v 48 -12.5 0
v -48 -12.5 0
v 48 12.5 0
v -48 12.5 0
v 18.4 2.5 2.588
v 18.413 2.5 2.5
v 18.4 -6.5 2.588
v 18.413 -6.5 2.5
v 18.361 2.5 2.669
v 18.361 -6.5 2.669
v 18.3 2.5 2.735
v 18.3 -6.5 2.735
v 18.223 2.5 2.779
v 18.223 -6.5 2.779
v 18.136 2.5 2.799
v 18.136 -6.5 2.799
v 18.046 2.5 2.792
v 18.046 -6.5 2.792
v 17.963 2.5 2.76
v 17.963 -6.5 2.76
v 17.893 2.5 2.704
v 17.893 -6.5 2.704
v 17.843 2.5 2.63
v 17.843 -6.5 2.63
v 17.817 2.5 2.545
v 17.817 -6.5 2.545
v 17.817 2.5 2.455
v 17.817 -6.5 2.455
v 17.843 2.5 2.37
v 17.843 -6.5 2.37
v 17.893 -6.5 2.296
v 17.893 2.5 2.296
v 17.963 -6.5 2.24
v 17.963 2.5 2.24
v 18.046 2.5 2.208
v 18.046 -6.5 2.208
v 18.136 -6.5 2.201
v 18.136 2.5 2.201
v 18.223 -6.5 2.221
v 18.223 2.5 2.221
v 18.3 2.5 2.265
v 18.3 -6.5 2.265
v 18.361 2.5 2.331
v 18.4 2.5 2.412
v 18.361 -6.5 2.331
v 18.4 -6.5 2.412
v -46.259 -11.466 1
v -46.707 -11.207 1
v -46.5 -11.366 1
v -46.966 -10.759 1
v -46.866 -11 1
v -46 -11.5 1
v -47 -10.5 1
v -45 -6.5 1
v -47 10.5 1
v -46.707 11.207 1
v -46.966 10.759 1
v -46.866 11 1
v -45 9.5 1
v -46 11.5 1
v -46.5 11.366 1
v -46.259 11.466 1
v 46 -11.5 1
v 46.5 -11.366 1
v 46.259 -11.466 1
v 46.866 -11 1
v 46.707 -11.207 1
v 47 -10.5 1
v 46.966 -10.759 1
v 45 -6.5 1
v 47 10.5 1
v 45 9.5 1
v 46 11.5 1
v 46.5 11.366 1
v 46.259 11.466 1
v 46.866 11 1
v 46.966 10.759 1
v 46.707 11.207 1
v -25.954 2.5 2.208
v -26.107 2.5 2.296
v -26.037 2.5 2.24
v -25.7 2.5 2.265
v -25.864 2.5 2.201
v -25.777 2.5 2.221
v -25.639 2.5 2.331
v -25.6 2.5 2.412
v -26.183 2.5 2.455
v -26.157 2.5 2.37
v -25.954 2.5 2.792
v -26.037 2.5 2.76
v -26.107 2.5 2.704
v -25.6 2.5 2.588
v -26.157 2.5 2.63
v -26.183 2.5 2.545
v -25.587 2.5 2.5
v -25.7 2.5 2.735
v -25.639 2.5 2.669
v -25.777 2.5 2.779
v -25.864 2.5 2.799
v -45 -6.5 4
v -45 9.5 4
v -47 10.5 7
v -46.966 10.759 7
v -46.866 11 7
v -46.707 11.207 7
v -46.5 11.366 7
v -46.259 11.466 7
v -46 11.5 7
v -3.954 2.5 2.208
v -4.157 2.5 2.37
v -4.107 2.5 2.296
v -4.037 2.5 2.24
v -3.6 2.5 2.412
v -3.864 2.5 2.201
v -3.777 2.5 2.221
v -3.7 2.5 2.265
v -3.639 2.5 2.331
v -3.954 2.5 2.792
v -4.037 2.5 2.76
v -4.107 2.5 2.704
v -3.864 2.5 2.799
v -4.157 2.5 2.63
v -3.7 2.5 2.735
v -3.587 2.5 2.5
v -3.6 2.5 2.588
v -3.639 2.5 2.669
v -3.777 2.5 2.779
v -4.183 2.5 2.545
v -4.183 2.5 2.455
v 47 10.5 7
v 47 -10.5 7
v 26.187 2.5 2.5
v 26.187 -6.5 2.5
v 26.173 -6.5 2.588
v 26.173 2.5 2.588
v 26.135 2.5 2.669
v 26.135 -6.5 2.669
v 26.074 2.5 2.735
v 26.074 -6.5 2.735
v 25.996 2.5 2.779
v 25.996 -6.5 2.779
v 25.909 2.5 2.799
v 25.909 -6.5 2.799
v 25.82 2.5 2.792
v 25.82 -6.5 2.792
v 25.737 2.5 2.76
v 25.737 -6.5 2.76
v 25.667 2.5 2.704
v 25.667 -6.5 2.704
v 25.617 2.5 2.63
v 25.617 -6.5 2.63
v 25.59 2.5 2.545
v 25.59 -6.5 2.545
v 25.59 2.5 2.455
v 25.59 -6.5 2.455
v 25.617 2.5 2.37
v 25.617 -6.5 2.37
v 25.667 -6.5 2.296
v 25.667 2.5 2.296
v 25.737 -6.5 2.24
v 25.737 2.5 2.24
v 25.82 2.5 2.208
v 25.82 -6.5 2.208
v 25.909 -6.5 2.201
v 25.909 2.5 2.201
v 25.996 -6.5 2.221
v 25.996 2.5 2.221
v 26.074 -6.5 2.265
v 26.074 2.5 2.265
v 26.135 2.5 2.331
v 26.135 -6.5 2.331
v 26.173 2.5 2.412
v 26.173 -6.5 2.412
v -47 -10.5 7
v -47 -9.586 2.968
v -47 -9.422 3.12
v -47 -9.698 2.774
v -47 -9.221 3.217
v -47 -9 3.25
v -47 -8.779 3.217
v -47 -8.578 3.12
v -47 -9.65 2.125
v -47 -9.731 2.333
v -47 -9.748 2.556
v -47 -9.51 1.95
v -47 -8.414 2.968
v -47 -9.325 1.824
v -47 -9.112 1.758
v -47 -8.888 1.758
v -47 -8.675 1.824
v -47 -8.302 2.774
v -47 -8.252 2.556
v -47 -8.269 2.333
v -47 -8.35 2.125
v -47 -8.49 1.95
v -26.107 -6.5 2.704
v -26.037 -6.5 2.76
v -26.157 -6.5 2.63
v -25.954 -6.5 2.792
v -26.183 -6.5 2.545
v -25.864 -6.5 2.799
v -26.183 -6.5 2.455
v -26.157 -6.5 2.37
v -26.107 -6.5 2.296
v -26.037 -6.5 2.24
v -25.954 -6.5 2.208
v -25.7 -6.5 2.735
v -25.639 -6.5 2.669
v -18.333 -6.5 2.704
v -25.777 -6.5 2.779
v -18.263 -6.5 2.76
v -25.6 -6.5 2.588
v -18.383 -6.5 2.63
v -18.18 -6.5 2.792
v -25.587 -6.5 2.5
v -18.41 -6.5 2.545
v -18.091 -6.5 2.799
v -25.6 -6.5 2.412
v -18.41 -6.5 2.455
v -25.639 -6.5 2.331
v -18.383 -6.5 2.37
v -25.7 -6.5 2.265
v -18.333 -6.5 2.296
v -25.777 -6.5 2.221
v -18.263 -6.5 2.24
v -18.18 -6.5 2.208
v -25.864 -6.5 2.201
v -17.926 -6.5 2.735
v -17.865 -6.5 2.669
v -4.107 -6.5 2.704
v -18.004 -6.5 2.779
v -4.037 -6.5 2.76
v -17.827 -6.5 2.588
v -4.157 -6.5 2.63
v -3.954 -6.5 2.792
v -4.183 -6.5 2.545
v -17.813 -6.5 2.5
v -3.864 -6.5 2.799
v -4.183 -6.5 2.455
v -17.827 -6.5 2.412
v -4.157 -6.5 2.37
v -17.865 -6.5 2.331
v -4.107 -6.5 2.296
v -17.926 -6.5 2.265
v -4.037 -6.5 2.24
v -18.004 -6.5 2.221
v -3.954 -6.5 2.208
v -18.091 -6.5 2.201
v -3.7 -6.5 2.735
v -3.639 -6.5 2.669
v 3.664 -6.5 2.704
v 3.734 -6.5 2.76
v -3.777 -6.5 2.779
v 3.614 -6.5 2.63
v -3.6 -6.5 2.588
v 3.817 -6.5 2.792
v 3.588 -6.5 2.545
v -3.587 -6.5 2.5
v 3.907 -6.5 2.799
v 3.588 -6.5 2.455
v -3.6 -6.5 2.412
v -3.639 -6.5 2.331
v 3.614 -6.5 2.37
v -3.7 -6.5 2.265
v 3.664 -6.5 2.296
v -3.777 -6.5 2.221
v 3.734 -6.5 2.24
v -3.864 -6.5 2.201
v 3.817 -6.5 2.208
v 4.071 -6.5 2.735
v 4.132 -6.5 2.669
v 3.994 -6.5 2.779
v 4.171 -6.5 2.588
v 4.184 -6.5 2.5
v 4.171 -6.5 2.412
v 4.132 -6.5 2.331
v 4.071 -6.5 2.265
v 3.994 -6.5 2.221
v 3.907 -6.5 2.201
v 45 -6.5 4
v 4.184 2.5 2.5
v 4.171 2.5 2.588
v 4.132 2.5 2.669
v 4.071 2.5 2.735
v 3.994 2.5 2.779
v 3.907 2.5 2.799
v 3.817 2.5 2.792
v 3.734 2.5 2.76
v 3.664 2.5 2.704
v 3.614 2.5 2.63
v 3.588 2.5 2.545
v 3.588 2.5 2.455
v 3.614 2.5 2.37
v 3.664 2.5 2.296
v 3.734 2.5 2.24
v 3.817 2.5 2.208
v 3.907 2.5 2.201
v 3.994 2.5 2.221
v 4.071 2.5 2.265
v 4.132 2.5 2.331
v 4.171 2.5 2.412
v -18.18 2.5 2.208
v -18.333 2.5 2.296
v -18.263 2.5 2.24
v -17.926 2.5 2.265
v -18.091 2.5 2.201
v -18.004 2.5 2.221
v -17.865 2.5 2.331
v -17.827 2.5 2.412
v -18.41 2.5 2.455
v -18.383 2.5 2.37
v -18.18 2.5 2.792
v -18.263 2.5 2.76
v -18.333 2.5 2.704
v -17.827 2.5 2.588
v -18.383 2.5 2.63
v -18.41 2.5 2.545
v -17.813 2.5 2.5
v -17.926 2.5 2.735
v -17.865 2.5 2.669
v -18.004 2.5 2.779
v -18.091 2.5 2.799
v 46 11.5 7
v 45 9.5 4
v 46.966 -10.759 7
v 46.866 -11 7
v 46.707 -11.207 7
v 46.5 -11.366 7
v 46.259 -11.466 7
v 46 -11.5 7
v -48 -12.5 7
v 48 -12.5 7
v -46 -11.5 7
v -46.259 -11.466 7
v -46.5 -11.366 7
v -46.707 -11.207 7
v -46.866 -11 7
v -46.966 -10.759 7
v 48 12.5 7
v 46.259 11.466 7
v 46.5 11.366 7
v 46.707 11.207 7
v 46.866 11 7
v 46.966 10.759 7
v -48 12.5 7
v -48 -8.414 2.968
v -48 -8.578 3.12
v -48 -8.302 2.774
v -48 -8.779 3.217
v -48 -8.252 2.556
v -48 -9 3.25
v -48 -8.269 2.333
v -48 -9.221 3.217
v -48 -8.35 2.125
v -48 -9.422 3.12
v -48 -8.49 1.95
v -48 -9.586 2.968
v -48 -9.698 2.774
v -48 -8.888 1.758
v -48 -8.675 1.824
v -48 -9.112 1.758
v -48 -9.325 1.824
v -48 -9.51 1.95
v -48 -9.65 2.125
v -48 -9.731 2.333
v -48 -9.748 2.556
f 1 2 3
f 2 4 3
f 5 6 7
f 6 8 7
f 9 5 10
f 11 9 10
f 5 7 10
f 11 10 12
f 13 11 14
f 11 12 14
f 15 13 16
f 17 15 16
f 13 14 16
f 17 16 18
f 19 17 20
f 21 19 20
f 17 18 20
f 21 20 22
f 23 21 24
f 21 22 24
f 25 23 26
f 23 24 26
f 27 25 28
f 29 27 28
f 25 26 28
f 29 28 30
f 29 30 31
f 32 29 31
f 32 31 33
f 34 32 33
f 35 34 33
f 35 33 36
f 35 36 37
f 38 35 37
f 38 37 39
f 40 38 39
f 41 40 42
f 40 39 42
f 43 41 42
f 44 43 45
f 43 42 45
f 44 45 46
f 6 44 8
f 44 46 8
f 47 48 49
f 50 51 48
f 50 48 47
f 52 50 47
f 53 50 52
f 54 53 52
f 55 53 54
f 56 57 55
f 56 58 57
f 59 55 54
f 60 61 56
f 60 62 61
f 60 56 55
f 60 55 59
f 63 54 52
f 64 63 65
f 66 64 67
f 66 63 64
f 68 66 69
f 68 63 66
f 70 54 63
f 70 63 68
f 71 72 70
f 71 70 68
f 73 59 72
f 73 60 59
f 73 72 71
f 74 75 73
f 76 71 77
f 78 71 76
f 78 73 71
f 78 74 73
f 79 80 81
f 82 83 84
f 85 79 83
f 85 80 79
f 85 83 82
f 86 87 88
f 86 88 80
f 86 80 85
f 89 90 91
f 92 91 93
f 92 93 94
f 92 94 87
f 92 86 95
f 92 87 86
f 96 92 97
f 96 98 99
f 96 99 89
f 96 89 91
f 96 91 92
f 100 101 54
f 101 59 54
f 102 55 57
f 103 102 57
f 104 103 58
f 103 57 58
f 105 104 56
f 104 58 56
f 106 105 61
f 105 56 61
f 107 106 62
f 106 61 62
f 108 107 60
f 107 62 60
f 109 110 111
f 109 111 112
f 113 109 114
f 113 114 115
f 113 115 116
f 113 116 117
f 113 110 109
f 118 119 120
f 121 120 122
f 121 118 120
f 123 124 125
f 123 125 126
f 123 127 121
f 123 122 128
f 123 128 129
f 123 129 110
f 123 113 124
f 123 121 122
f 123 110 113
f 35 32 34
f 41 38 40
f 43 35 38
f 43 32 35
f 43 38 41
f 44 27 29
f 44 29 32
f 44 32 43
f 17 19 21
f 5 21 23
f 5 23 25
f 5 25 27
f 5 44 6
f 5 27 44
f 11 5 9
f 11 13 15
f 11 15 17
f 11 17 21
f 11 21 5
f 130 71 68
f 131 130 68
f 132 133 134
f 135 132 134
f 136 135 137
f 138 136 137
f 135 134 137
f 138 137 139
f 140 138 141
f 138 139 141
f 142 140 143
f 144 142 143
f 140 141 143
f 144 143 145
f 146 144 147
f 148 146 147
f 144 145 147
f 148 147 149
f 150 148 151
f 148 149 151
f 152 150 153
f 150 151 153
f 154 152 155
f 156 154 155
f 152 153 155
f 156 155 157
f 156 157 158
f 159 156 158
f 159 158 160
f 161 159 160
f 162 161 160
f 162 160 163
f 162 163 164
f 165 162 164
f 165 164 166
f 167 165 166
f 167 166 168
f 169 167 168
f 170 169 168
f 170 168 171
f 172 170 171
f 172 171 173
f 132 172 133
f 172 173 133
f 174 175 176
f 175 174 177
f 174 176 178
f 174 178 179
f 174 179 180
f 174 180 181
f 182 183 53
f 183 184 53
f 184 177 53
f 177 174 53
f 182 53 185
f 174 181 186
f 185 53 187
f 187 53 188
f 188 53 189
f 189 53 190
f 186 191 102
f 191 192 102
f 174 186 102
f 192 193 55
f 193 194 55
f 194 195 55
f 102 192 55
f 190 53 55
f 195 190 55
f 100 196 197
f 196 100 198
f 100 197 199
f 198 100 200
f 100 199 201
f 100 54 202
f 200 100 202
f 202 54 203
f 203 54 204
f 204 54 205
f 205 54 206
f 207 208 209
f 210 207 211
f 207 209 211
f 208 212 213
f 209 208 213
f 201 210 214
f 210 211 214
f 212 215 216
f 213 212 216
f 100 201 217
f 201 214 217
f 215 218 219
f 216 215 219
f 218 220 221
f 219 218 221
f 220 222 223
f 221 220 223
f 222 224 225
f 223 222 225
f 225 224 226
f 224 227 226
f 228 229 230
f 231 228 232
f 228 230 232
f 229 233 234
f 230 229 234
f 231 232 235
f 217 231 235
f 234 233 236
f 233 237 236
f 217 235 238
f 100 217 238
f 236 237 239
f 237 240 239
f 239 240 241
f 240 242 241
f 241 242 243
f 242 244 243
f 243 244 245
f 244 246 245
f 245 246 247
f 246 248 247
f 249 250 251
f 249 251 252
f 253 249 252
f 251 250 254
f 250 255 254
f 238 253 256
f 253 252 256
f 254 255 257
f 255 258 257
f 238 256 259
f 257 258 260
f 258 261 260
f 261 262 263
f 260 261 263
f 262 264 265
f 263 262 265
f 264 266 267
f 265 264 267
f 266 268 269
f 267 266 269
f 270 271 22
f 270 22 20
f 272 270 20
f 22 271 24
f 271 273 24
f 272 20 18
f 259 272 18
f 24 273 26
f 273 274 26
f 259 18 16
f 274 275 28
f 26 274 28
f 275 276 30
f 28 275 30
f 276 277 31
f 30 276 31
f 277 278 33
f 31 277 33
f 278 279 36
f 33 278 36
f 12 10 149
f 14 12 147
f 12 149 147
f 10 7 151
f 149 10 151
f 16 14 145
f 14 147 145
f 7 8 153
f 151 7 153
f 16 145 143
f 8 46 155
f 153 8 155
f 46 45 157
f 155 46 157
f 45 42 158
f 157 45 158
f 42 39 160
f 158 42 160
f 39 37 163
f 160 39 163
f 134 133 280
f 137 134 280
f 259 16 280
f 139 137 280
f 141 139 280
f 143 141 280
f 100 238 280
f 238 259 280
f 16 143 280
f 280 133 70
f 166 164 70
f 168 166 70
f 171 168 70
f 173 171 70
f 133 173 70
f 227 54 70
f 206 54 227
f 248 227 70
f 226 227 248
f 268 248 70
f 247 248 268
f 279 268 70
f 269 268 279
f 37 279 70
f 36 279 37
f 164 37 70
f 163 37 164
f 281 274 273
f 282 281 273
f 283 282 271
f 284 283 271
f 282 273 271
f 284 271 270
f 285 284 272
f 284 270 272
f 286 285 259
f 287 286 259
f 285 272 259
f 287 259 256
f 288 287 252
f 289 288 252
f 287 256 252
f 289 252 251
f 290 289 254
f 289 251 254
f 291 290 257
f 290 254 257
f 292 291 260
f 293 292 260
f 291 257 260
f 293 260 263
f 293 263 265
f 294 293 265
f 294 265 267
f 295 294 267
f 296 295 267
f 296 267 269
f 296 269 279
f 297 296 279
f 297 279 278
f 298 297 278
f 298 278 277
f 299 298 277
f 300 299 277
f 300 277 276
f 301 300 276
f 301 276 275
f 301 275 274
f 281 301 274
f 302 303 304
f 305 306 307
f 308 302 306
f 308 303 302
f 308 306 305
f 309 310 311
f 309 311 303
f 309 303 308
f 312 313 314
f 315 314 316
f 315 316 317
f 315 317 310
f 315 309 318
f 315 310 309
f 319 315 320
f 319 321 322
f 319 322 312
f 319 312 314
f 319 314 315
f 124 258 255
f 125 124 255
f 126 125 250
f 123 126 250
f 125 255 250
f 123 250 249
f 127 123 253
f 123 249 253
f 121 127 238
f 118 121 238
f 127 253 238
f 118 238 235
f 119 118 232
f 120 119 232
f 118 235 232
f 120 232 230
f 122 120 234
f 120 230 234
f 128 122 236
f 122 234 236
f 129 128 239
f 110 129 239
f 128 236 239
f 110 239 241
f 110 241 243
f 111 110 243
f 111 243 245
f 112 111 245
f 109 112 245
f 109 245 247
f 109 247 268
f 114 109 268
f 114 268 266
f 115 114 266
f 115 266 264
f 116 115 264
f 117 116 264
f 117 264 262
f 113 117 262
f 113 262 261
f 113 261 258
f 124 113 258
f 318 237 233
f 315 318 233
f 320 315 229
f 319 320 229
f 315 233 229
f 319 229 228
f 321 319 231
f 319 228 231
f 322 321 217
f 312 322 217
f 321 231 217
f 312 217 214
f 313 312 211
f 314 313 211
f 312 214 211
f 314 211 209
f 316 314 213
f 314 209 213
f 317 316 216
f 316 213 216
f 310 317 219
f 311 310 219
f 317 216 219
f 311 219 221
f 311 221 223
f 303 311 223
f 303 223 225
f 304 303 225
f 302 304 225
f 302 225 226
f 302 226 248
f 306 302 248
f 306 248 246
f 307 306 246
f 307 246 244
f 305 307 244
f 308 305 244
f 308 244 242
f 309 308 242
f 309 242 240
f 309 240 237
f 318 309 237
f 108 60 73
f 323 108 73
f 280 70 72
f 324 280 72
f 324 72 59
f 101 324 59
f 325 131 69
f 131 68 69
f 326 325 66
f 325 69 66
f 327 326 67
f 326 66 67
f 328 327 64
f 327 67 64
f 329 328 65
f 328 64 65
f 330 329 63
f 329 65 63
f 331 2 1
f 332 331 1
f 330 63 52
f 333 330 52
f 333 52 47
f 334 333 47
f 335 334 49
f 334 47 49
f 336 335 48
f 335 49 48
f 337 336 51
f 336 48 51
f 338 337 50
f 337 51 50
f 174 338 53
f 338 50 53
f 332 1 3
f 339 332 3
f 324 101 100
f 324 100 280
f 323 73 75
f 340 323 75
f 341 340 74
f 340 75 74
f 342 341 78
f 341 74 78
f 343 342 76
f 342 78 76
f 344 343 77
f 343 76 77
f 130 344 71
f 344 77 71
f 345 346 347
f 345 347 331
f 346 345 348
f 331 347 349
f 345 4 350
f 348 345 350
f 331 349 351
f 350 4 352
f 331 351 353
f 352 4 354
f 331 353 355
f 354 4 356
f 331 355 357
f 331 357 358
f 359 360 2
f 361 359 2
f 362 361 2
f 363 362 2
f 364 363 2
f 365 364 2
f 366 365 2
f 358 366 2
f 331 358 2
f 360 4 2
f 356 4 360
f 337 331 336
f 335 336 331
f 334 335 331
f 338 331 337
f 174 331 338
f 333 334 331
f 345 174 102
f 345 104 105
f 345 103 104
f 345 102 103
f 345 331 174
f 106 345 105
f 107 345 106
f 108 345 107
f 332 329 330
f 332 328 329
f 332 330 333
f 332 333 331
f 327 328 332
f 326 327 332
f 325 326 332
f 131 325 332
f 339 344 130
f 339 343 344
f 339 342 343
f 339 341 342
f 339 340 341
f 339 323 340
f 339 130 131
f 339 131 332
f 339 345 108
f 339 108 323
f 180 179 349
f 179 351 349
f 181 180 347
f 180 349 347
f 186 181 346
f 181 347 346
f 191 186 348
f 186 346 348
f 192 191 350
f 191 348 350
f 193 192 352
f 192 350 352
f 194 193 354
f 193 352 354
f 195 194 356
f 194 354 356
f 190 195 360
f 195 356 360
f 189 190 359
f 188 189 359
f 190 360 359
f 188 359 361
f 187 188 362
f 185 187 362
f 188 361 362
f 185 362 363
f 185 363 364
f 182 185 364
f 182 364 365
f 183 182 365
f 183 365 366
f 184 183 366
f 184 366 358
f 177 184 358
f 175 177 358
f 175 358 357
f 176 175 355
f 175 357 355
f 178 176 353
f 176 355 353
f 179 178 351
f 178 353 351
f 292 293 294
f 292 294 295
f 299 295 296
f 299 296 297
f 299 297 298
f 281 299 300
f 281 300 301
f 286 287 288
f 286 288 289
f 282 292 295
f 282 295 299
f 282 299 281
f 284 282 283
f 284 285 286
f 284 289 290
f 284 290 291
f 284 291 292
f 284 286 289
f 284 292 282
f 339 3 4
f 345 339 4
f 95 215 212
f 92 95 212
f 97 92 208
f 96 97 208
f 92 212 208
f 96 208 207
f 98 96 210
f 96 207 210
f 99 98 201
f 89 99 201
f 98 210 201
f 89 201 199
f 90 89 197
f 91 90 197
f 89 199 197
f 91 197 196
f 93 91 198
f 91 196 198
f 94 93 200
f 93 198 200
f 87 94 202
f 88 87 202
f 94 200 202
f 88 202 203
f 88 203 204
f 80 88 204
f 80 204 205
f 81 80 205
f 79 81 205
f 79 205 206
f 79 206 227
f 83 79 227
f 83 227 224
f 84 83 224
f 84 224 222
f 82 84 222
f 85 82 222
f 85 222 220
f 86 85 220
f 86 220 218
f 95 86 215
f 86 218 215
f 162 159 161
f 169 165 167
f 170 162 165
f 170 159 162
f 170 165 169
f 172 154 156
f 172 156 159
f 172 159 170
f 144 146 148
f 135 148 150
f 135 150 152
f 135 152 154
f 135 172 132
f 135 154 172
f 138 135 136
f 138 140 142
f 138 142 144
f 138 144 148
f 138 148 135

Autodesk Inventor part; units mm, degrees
ref_plane "YZ Plane" through (0, 0, 0) normal (1, 0, 0) x (0, 1, 0)
ref_plane "XZ Plane" through (0, 0, 0) normal (0, 1, 0) x (-1, 0, 0)
ref_plane "XY Plane" through (0, 0, 0) normal (0, 0, 1) x (1, 0, 0)
sketch "Sketch2" plane through (0, 0, 0) normal (0, 0, 1) x (1, 0, 0)
  line L0 (-46, 11.5) -> (46, 11.5)
  line L1 (47, 10.5) -> (47, -10.5)
  line L2 (46, -11.5) -> (-46, -11.5)
  line L3 (-47, -10.5) -> (-47, 10.5)
  line L4 (-47, 11.5) -> (47, -11.5) construction
  line L5 (47, 11.5) -> (-47, -11.5) construction
  line L6 (48, 12.5) -> (-48, 12.5)
  line L7 (-48, 12.5) -> (-48, -12.5)
  line L8 (-48, -12.5) -> (48, -12.5)
  line L9 (48, -12.5) -> (48, 12.5)
  arc A0 (47, 10.5) -> (46, 11.5) centre (46, 10.5) ccw
  arc A1 (46, -11.5) -> (47, -10.5) centre (46, -10.5) ccw
  arc A2 (-47, -10.5) -> (-46, -11.5) centre (-46, -10.5) ccw
  arc A3 (-46, 11.5) -> (-47, 10.5) centre (-46, 10.5) ccw
  line L10 (-45, -6.5) -> (45, -6.5)
  line L11 (45, -6.5) -> (45, 9.5)
  line L12 (45, 9.5) -> (-45, 9.5)
  line L13 (-45, 9.5) -> (-45, -6.5)
  point P0 (0, 0)
  point P1 (0, 1.6851)
  dimension "d0" = 94
  dimension "d1" = 23
  dimension "d3" = 1
  dimension "d10" = 1
  dimension "d84" = 90
  dimension "d85" = 16
  dimension "d86" = 2
  dimension "d87" = 2
  dimension "d95" = 2
extrude "Extrusion1" add sketch "Sketch2" along normal blind 1 contours L0 A0 L1 A1 L2 A2 L3 A3 | L9 L8 L7 L6 | L13 L12 L11 L10
extrude "Extrusion2" add sketch "Sketch2" along normal blind 7 contours L9 L8 L7 L6
extrude "Extrusion3" add sketch "Sketch2" along normal blind 4 contours L13 L12 L11 L10
sketch "Sketch4" plane through (-48, -12.5, 0) normal (0, -1, 0) x (1, 0, 0)
  circle A0 centre (22.1132, 5) radius 0.5
  circle A1 centre (29.8868, 5) radius 0.5
  circle A2 centre (44.1132, 5) radius 0.5
  circle A3 centre (51.8842, 5) radius 0.5
  circle A4 centre (66.1132, 5) radius 0.5
  circle A5 centre (73.8868, 5) radius 0.5
  line L0 (0, 6) -> (96, 6)
  line L1 (96, 7) -> (0, 7) projected
  line L2 (22.1132, 2) -> (22.1132, 2)
  line L3 (22.6132, 2.5) -> (22.6132, 8)
  line L4 (22.6132, 8) -> (21.6132, 8)
  line L5 (21.6132, 8) -> (21.6132, 2.5)
  line L6 (21.6132, 2) -> (22.6132, 8) construction
  line L7 (22.6132, 2) -> (21.6132, 8) construction
  line L8 (29.8868, 2) -> (29.8868, 2)
  line L9 (30.3868, 2.5) -> (30.3868, 8)
  line L10 (30.3868, 8) -> (29.3868, 8)
  line L11 (29.3868, 8) -> (29.3868, 2.5)
  line L12 (29.3868, 2) -> (30.3868, 8) construction
  line L13 (30.3868, 2) -> (29.3868, 8) construction
  line L14 (44.1132, 2) -> (44.1132, 2)
  line L15 (44.6132, 2.5) -> (44.6132, 8)
  line L16 (44.6132, 8) -> (43.6132, 8)
  line L17 (43.6132, 8) -> (43.6132, 2.5)
  line L18 (43.6132, 2) -> (44.6132, 8) construction
  line L19 (44.6132, 2) -> (43.6132, 8) construction
  line L20 (51.8842, 2) -> (51.8842, 2)
  line L21 (52.3842, 2.5) -> (52.3842, 8)
  line L22 (52.3842, 8) -> (51.3842, 8)
  line L23 (51.3842, 8) -> (51.3842, 2.5)
  line L24 (51.3842, 2) -> (52.3842, 8) construction
  line L25 (52.3842, 2) -> (51.3842, 8) construction
  line L26 (66.1132, 2) -> (66.1132, 2)
  line L27 (65.6132, 2.5) -> (65.6132, 8)
  line L28 (65.6132, 8) -> (66.6132, 8)
  line L29 (66.6132, 8) -> (66.6132, 2.5)
  line L30 (66.6132, 2) -> (65.6132, 8) construction
  line L31 (65.6132, 2) -> (66.6132, 8) construction
  line L32 (73.8868, 2) -> (73.8868, 2)
  line L33 (73.3868, 2.5) -> (73.3868, 8)
  line L34 (73.3868, 8) -> (74.3868, 8)
  line L35 (74.3868, 8) -> (74.3868, 2.5)
  line L36 (74.3868, 2) -> (73.3868, 8) construction
  line L37 (73.3868, 2) -> (74.3868, 8) construction
  arc A6 (21.6132, 2.5) -> (22.1132, 2) centre (22.1132, 2.5) ccw
  arc A7 (22.1132, 2) -> (22.6132, 2.5) centre (22.1132, 2.5) ccw
  arc A8 (29.3868, 2.5) -> (29.8868, 2) centre (29.8868, 2.5) ccw
  arc A9 (29.8868, 2) -> (30.3868, 2.5) centre (29.8868, 2.5) ccw
  arc A10 (43.6132, 2.5) -> (44.1132, 2) centre (44.1132, 2.5) ccw
  arc A11 (44.1132, 2) -> (44.6132, 2.5) centre (44.1132, 2.5) ccw
  arc A12 (51.3842, 2.5) -> (51.8842, 2) centre (51.8842, 2.5) ccw
  arc A13 (51.8842, 2) -> (52.3842, 2.5) centre (51.8842, 2.5) ccw
  arc A14 (65.6132, 2.5) -> (66.1132, 2) centre (66.1132, 2.5) ccw
  arc A15 (66.1132, 2) -> (66.6132, 2.5) centre (66.1132, 2.5) ccw
  arc A16 (73.3868, 2.5) -> (73.8868, 2) centre (73.8868, 2.5) ccw
  arc A17 (73.8868, 2) -> (74.3868, 2.5) centre (73.8868, 2.5) ccw
  point P0 (96, 0)
  point P1 (69, 6)
  point P2 (71, 6)
  point P3 (49, 6)
  point P4 (47, 6)
  point P5 (27, 6)
  point P6 (25, 6)
  point P7 (73.8868, 2)
  point P8 (66.1132, 2)
  point P9 (51.8842, 2)
  point P10 (44.1132, 2)
  point P11 (29.8868, 2)
  point P12 (22.1132, 2)
  dimension "d59" = 1
  dimension "d60" = 1
  dimension "d61" = 1
  dimension "d62" = 1
  dimension "d63" = 1
  dimension "d64" = 1
  dimension "d65" = 1
  dimension "d66" = 6
  dimension "d67" = 1
  dimension "d68" = 6
  dimension "d69" = 1
  dimension "d70" = 6
  dimension "d71" = 1
  dimension "d72" = 6
  dimension "d73" = 1
  dimension "d74" = 6
  dimension "d75" = 1
  dimension "d76" = 6
  dimension "d81" = 0.5
sketch "Sketch3" plane through (0, -12.5, 4) normal (0, -1, 0) x (1, 0, 0)
  line L0 (-53.1158, -2.5) -> (46.8842, -2.5) construction
  line L1 (43, -1.5) -> (23, -1.5) construction
  line L2 (23, -1.5) -> (23, 3.5) construction
  line L3 (23, 3.5) -> (43, 3.5) construction
  line L4 (43, 3.5) -> (43, -1.5) construction
  line L5 (23, -1.5) -> (23, 3.7137) construction
  line L6 (43, -1.5) -> (40.1132, 3.5) construction
  line L7 (46.8842, -2.5) -> (46.8842, 3.2735) construction
  line L8 (23, -1.5) -> (25.8868, 3.5) construction
  line L9 (23, -1.5) -> (23, 3.1279) construction
  line L10 (21, -1.5) -> (18.1132, 3.5) construction
  line L11 (1, 3.5) -> (21, 3.5) construction
  line L12 (1, -1.5) -> (3.8868, 3.5) construction
  line L13 (-1, -1.5) -> (-3.8868, 3.5) construction
  line L14 (-21, 3.5) -> (-1, 3.5) construction
  line L15 (-21, -1.5) -> (-18.1132, 3.5) construction
  line L16 (-23, -1.5) -> (-25.8868, 3.5) construction
  line L17 (-43, 3.5) -> (-23, 3.5) construction
  line L18 (-43, -1.5) -> (-40.1132, 3.5) construction
  line L19 (43, 3.5) -> (-43, 3.5) construction
  line L20 (0, 3.5) -> (0, 3.5) construction
  circle A0 centre (-25.8868, -1.5) radius 0.3
  circle A1 centre (-18.1132, -1.5) radius 0.3
  circle A2 centre (-3.8868, -1.5) radius 0.3
  circle A3 centre (3.8842, -1.5) radius 0.3
  circle A4 centre (18.1132, -1.5) radius 0.3
  circle A5 centre (25.8868, -1.5) radius 0.3
  line L21 (-45, 0) -> (-45, 0) projected
  line L22 (45, 0) -> (45, 0) projected
  line L23 (-48, -4) -> (-48, -4) projected
  line L24 (-48, -1.5) -> (48, -1.5)
  line L25 (48, -4) -> (48, -4) projected
  line L26 (48, -4) -> (48, 3) projected
  point P0 (3.8842, 2.5)
  point P1 (25.8868, -1.5)
  point P2 (48, -0.5)
  dimension "d45" = 20
  dimension "d46" = 5
  dimension "d47" = 30
  dimension "d48" = 30
  dimension "d49" = 22
  dimension "d52" = 0
  dimension "d53" = 0.6
  dimension "d54" = 0.6
  dimension "d55" = 0.6
  dimension "d56" = 0.6
  dimension "d57" = 0.6
  dimension "d58" = 0.6
  dimension "d82" = 1
extrude "Extrusion4" [suppressed]
extrude "Extrusion5" cut sketch "Sketch3" against normal blind 15
sketch "Sketch5" plane through (-48, -12.5, 0) normal (-1, 0, 0) x (0, 0, 1)
  line L0 (7, 1) -> (1, 1)
  line L1 (1, 1) -> (1, 6)
  line L2 (1, 6) -> (7, 6)
  line L3 (7, 6) -> (7, 1)
  circle A0 centre (2.5, 3.5) radius 0.75
  point P0 (0, 12.5)
  dimension "d88" = 1.5
  dimension "d89" = 1.5
  dimension "d90" = 2.5
extrude "Extrusion6" cut sketch "Sketch5" against normal blind 2 contours A0
extrude "Extrusion7" add sketch "Sketch3" against normal blind 1
properties part number "sdm_finger_eit_chamber_mould_horizontal_e_holes_v2"
